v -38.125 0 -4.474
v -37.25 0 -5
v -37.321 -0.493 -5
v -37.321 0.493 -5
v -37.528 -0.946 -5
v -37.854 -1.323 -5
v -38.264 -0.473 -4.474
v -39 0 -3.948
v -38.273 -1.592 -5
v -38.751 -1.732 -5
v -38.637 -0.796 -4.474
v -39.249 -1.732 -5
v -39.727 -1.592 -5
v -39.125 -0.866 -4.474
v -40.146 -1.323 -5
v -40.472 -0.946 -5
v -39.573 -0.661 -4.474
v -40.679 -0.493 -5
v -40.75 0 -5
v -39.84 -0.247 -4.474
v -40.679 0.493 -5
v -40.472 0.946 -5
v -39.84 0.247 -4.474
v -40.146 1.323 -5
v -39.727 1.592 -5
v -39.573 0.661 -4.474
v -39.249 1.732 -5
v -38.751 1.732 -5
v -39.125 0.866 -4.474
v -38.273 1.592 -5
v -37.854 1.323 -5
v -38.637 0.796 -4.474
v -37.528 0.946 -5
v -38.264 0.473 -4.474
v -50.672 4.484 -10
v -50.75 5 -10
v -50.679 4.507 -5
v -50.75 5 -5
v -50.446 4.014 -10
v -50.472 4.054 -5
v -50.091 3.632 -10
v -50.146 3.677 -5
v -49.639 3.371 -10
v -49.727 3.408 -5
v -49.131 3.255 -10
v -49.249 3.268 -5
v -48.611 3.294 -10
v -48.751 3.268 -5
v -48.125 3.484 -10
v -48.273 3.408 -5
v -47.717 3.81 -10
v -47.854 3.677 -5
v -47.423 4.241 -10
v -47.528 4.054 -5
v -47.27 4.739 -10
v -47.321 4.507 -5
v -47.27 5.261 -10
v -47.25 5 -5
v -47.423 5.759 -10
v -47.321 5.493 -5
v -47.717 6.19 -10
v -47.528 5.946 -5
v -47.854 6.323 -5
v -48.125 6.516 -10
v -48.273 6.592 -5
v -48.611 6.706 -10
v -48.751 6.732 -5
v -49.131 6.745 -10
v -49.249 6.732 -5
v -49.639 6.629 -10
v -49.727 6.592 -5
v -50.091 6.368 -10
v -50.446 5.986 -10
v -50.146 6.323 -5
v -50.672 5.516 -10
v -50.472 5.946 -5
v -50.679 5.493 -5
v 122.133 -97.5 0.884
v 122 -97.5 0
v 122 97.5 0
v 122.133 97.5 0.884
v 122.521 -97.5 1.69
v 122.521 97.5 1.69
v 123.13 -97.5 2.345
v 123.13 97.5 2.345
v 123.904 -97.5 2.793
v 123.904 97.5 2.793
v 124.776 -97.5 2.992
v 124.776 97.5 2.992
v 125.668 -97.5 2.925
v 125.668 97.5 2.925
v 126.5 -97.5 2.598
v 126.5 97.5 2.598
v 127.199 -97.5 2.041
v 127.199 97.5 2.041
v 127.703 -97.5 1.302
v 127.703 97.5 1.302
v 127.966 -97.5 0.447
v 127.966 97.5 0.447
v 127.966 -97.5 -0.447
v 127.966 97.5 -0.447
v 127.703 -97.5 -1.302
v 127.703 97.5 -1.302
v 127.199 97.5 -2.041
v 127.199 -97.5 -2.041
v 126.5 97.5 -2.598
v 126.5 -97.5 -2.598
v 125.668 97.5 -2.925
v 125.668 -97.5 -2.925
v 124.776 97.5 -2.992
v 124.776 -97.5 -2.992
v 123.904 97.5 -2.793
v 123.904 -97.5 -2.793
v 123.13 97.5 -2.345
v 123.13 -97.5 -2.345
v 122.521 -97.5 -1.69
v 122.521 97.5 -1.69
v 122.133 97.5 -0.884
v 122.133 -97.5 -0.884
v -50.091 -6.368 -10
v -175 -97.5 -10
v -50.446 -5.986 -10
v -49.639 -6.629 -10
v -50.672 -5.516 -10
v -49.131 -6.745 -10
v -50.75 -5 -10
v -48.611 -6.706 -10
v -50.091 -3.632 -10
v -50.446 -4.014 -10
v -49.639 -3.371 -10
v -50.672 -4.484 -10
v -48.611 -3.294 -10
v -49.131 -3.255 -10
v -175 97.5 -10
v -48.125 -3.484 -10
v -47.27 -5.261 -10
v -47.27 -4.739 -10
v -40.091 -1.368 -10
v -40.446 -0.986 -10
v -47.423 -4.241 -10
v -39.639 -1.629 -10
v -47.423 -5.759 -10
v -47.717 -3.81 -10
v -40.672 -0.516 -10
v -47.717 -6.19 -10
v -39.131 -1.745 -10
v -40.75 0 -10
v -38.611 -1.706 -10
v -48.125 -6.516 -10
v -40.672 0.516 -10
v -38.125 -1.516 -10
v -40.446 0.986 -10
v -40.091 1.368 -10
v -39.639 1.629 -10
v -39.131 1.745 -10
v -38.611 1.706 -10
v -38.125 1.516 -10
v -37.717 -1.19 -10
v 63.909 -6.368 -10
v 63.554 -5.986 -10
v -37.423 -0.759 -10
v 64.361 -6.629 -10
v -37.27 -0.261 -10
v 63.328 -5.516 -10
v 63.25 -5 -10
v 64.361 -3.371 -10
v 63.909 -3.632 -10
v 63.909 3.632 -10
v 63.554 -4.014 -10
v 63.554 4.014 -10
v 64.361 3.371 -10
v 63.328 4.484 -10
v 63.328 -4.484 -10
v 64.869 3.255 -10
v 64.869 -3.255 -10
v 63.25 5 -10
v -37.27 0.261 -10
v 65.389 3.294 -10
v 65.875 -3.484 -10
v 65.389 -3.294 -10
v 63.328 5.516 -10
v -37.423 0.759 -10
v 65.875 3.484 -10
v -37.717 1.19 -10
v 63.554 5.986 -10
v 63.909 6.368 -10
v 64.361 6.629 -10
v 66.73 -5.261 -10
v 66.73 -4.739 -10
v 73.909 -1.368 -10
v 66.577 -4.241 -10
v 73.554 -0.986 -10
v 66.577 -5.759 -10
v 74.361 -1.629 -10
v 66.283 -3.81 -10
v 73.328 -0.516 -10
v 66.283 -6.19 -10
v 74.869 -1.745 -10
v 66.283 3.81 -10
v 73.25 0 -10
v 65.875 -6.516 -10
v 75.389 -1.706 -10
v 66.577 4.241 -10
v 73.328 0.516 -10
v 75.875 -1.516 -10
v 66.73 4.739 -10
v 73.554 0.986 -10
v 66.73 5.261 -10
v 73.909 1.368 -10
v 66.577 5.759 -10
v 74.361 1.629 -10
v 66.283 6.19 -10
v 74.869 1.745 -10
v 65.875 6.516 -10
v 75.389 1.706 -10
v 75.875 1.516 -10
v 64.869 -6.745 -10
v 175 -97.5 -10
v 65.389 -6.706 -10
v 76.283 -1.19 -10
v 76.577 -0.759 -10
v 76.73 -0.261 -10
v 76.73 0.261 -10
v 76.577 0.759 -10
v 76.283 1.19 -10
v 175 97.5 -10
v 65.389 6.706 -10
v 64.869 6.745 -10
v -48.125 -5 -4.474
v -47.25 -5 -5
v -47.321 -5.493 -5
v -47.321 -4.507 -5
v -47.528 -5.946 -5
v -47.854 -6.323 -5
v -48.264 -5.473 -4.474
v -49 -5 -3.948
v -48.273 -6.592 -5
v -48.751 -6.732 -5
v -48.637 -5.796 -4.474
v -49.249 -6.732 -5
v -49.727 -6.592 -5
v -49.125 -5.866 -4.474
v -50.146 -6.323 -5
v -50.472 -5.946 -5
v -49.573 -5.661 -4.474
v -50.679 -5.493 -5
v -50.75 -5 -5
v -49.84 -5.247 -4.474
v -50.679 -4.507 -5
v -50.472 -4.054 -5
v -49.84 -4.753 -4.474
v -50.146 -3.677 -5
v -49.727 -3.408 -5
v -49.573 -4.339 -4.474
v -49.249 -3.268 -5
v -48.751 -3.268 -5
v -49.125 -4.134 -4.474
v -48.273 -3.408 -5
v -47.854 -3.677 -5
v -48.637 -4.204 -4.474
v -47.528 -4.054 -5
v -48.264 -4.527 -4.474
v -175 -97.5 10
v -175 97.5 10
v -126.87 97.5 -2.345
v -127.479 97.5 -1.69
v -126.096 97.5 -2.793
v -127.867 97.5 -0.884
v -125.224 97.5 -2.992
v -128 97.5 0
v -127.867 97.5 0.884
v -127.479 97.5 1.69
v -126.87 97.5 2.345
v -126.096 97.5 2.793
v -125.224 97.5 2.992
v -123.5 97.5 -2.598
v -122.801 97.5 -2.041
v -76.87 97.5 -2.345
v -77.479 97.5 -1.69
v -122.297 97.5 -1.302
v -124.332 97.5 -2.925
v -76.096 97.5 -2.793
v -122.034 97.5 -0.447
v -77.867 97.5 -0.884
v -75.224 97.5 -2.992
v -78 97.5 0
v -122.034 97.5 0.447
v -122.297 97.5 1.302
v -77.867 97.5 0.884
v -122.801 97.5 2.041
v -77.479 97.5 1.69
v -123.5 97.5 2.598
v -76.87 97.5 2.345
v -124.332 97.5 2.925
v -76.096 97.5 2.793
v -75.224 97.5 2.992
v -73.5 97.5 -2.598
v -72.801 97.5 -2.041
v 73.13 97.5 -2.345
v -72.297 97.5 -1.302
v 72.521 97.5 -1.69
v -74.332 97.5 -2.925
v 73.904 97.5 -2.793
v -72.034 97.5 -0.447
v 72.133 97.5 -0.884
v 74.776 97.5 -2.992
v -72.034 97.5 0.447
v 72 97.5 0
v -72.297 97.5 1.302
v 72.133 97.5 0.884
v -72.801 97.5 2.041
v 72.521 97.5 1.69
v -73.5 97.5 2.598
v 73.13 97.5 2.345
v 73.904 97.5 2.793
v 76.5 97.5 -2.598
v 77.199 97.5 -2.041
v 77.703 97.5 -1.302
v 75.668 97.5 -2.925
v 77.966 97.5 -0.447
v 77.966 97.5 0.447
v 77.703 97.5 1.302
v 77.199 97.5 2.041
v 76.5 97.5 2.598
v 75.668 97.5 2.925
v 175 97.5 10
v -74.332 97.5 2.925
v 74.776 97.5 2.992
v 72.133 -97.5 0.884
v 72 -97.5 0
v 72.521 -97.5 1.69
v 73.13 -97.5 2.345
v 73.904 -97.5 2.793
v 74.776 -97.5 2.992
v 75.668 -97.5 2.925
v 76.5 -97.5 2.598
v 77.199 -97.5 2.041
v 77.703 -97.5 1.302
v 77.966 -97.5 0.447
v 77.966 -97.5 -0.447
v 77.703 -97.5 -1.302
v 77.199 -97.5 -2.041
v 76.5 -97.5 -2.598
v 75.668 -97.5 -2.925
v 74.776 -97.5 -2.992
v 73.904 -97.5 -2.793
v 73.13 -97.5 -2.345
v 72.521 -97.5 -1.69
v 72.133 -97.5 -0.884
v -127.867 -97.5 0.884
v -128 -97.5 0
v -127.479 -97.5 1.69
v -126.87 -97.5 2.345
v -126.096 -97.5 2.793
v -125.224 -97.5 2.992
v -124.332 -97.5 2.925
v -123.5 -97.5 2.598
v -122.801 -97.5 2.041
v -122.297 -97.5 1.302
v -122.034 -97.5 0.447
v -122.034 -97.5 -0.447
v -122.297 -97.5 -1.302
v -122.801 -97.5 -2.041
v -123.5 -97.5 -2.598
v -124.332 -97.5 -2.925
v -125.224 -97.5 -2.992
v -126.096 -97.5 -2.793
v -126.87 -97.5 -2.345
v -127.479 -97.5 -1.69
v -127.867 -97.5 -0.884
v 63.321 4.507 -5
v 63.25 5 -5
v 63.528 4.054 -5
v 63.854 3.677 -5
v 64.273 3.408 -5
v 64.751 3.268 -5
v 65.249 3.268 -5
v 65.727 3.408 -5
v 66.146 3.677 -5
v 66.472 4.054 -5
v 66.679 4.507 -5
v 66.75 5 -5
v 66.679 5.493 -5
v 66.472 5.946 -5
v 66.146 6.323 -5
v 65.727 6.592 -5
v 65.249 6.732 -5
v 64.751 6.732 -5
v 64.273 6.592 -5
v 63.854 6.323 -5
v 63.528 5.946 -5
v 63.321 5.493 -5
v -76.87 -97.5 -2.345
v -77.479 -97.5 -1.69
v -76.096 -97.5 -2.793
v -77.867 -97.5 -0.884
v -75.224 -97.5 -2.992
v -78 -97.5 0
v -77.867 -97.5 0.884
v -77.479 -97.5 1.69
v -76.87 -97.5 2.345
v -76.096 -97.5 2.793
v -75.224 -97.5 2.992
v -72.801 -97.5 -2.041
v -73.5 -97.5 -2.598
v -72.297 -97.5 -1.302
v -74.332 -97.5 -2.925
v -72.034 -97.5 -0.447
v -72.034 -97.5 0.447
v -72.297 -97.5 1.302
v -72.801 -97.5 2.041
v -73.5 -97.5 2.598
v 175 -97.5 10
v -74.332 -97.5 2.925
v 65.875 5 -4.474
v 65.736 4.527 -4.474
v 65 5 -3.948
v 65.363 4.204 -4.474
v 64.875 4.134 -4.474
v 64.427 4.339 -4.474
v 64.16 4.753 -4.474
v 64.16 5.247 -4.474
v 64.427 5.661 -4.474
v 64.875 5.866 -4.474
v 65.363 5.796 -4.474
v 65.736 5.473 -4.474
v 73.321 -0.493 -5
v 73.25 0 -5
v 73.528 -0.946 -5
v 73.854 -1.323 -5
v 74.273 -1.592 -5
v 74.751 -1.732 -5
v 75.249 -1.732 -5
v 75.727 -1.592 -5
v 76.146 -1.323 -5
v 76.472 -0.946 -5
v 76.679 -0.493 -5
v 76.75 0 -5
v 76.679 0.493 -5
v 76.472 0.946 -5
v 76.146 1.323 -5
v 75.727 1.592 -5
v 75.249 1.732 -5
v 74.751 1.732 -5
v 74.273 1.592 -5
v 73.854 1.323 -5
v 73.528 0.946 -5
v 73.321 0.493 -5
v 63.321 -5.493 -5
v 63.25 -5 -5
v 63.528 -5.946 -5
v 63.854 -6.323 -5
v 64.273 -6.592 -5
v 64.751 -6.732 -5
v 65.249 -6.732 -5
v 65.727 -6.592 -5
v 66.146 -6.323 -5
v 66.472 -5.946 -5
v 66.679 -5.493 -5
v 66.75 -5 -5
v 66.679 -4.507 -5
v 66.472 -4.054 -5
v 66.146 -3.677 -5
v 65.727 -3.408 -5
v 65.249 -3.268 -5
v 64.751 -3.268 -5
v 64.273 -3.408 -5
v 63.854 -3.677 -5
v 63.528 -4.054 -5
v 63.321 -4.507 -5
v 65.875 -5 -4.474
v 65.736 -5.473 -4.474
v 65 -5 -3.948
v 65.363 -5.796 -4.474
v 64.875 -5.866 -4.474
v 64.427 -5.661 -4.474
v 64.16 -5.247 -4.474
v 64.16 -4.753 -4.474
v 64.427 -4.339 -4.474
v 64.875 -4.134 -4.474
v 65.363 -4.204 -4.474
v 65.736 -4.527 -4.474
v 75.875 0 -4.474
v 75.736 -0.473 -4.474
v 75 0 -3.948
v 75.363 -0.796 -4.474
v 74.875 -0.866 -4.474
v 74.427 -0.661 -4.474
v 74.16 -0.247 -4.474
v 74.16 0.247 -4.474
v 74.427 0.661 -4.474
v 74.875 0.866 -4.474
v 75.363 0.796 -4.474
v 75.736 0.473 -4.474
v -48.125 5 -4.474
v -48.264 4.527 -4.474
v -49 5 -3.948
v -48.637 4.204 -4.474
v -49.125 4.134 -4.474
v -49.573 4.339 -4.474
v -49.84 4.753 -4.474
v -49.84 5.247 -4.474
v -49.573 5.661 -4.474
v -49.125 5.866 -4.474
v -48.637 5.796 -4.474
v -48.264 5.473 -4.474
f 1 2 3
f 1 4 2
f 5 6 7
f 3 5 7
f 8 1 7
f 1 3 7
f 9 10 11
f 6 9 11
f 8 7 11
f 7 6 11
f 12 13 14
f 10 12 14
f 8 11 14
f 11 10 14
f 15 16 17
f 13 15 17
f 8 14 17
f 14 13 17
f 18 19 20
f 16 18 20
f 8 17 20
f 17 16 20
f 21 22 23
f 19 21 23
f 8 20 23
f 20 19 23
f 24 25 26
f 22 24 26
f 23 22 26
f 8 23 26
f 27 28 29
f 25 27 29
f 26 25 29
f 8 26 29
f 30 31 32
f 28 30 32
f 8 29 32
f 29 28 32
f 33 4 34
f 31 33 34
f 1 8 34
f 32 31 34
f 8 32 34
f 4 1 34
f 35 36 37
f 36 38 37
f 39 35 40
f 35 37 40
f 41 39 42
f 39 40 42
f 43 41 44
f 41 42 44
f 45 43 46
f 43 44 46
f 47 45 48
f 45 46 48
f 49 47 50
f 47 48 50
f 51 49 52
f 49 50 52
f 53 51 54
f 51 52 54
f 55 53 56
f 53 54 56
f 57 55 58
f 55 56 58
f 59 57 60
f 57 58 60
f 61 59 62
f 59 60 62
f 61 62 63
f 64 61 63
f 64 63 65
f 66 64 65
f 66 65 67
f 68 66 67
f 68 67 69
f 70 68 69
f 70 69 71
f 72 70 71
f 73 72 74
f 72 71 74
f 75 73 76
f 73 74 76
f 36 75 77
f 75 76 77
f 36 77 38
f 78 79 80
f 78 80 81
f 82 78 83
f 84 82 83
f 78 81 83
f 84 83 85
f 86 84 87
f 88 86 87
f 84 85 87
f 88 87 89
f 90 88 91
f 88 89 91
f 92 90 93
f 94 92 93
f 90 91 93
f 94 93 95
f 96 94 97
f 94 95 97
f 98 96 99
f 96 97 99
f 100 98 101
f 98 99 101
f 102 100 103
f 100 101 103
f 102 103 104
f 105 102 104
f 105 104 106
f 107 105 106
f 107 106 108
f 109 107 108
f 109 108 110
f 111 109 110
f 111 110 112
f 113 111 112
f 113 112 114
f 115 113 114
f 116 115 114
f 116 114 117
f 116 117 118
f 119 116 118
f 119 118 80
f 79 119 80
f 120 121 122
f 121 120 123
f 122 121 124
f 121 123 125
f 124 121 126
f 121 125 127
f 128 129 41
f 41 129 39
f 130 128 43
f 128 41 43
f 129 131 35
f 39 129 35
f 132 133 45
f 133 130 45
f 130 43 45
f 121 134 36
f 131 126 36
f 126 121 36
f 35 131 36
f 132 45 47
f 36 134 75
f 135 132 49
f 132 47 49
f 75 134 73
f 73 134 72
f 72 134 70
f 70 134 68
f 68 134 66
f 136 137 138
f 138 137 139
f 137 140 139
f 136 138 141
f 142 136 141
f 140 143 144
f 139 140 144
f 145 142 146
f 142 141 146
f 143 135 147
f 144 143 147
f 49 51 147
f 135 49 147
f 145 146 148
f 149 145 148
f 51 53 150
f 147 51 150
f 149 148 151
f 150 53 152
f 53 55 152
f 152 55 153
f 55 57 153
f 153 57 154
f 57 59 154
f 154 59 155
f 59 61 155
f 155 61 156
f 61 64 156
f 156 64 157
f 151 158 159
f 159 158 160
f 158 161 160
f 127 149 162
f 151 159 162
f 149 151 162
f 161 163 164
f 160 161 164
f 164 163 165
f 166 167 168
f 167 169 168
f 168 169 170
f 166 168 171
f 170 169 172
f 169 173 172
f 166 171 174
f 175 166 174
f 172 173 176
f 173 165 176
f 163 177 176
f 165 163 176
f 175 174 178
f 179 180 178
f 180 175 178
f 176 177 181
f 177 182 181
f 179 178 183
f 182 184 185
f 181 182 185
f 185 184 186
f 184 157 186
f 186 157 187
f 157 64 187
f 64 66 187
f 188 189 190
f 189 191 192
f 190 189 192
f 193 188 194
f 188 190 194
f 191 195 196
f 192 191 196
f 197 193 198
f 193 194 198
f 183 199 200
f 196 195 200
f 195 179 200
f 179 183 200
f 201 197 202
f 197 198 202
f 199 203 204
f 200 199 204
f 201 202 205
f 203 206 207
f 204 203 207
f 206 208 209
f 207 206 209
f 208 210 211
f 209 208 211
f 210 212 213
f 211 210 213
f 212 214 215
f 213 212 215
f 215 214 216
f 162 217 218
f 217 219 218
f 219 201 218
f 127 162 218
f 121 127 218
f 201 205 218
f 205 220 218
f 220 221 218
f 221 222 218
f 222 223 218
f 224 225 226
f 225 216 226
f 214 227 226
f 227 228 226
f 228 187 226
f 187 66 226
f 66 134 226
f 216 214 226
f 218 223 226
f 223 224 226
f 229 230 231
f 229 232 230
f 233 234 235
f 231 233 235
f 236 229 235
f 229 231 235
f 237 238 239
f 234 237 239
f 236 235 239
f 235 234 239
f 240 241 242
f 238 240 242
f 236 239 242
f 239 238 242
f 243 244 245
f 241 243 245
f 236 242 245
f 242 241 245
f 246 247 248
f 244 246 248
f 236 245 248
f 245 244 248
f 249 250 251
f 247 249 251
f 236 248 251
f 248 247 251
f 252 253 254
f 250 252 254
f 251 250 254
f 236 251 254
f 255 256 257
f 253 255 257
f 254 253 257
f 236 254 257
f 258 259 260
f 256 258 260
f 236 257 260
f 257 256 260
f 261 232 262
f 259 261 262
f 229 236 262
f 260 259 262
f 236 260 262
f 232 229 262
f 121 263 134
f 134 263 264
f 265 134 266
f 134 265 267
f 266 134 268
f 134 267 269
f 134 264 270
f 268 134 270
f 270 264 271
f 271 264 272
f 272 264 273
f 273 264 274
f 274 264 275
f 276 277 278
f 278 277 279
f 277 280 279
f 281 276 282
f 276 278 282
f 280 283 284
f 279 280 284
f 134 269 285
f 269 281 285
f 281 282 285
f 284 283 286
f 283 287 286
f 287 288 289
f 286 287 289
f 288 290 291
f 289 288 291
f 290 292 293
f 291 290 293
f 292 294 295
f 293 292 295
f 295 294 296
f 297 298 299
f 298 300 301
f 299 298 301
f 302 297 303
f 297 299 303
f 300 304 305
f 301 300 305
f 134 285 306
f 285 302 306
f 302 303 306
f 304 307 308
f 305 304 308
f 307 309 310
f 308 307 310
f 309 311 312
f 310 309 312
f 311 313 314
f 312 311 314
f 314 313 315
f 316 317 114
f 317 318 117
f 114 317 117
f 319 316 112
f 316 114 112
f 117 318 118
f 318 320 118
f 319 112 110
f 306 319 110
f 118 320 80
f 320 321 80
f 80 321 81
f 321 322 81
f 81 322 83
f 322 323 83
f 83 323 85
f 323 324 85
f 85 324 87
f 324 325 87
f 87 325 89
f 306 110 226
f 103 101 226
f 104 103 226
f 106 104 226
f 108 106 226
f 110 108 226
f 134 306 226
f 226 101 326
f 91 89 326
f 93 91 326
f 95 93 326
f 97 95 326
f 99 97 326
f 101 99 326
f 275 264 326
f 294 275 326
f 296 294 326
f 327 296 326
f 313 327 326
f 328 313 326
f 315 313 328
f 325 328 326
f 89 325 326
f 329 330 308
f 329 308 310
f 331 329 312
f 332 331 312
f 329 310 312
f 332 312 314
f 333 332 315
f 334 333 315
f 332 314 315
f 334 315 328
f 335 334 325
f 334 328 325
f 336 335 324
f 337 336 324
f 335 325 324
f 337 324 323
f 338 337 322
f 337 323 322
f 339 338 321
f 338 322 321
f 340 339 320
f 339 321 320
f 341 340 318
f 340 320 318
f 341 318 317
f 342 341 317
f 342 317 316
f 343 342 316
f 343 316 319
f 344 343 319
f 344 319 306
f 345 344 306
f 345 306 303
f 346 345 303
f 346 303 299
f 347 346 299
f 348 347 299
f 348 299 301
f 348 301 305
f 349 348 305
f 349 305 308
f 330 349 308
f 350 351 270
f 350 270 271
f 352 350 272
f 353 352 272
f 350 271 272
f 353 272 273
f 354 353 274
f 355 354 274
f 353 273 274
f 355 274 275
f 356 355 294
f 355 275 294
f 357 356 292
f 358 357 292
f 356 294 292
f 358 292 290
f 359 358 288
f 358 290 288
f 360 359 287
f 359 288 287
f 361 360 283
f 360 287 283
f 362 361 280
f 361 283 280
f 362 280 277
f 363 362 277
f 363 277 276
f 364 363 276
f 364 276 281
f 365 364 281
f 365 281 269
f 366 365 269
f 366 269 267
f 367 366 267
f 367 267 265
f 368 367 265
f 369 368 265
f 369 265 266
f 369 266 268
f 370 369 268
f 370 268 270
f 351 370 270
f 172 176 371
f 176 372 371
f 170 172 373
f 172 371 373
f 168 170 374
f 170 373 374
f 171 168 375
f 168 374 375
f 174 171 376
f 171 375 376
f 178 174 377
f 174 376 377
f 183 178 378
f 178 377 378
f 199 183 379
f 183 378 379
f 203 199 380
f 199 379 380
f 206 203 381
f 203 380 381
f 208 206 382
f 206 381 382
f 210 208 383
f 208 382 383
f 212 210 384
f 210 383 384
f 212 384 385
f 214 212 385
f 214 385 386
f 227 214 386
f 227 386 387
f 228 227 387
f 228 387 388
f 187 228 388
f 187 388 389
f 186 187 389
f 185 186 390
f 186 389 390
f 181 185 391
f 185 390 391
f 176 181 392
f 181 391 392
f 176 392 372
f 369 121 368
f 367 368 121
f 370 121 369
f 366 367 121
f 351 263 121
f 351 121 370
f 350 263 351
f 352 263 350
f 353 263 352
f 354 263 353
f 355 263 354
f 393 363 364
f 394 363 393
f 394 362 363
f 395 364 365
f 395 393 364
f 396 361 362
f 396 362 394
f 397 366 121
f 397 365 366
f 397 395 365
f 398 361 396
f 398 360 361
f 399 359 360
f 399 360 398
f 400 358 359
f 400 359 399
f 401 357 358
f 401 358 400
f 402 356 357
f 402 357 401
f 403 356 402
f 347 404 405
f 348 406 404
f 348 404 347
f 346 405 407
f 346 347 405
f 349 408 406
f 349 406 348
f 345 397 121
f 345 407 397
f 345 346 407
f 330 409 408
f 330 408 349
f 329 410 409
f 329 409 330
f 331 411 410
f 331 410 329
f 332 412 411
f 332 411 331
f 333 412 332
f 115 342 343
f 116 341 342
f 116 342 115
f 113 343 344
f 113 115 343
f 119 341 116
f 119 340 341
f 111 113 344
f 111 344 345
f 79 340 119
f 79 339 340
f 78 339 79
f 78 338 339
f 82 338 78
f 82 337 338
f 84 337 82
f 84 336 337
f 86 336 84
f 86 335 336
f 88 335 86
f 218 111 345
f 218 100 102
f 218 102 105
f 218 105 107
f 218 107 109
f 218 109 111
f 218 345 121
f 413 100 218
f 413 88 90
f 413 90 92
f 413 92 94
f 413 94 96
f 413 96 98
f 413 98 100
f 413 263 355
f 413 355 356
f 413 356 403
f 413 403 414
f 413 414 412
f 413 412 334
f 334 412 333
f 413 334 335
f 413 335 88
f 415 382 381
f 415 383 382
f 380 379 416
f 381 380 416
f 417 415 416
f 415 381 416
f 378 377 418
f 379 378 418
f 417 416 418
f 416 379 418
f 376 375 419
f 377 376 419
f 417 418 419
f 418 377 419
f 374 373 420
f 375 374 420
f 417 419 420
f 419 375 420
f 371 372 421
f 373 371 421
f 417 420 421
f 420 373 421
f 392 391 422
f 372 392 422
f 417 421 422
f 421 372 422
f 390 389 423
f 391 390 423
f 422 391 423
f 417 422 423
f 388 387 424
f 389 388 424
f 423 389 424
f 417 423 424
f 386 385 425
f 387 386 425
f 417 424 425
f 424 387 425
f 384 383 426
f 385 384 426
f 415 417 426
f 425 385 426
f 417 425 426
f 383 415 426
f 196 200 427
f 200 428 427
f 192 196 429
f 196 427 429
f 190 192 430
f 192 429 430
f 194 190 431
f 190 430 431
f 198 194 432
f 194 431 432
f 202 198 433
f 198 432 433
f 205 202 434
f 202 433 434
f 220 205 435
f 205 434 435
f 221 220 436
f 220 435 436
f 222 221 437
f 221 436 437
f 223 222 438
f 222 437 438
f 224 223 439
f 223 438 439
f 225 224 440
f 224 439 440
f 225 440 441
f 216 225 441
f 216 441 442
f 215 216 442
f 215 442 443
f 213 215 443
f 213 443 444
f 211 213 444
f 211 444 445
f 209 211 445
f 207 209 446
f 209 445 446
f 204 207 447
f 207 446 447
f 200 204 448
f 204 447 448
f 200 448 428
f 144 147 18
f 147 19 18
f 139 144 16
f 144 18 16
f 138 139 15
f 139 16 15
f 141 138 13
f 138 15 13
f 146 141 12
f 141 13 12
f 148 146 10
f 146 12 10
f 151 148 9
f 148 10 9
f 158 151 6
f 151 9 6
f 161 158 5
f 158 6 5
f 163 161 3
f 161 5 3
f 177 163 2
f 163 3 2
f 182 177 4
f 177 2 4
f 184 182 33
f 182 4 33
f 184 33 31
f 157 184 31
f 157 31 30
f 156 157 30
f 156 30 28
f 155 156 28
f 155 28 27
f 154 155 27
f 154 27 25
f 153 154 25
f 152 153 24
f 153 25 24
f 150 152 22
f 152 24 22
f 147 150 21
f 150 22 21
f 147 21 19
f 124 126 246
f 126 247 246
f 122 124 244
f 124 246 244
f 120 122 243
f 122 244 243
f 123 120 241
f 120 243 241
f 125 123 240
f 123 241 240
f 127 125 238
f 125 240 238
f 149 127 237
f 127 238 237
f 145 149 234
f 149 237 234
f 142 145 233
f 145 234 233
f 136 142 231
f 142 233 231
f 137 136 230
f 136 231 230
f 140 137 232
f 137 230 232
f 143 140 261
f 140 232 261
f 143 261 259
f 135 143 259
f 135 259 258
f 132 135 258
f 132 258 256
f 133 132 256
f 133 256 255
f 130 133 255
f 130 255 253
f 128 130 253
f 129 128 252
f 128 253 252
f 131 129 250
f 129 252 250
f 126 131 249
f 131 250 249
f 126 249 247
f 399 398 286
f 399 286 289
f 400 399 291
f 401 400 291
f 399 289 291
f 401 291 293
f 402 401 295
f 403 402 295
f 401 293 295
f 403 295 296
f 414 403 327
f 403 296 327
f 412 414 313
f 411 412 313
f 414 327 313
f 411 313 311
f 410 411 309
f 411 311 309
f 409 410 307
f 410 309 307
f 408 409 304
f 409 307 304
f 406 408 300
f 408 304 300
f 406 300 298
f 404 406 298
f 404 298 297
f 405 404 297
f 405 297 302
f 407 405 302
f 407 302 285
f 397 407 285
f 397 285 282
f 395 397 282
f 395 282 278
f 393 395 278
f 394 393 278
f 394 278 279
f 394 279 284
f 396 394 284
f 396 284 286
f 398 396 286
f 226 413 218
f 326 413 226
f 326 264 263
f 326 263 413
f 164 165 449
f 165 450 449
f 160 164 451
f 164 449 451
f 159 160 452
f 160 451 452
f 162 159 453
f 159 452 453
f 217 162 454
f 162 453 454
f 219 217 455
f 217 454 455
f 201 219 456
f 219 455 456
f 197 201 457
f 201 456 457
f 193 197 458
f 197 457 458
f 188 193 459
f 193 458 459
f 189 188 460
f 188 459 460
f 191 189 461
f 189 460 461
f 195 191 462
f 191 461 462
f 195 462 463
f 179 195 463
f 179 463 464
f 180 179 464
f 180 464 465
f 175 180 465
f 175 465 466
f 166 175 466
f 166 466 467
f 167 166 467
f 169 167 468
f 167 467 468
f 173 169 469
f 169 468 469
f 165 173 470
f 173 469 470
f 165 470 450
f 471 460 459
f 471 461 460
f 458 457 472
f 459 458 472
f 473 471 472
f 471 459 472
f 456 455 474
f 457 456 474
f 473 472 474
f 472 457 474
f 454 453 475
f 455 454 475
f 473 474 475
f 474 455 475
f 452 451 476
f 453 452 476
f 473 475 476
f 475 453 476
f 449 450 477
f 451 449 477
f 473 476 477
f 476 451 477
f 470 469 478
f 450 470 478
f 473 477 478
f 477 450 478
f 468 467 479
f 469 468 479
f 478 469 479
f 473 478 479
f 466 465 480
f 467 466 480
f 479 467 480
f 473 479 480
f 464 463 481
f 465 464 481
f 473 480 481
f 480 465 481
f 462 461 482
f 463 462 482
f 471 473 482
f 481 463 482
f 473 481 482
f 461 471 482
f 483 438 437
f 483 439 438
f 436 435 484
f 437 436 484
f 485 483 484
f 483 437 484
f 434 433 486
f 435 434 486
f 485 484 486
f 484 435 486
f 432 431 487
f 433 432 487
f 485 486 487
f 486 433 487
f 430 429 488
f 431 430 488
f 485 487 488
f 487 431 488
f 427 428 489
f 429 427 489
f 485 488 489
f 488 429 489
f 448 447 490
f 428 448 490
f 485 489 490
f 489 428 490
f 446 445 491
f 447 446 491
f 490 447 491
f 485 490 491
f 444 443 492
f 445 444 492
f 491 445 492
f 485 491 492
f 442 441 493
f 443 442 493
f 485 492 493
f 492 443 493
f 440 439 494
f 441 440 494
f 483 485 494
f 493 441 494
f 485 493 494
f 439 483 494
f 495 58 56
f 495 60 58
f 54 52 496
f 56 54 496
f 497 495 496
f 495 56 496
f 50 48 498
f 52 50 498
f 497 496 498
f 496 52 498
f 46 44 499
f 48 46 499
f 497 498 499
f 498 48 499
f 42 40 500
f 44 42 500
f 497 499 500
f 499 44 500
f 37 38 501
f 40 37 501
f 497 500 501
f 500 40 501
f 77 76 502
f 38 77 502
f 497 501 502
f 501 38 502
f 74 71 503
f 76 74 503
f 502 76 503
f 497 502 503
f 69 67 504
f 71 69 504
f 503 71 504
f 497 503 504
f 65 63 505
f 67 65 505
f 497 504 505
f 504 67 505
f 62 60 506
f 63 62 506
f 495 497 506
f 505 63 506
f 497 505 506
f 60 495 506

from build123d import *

# Parameters (mm, degrees)
F0_W     = 350
F0_H     = 195
F1_DEPTH = 10
F3_D     = 6
F5_D     = 3.5
F5_DEPTH = 5
F5_TIP   = 1.0515060833


with BuildPart() as f1:
    # F0 (on Top) → F1 (new body, symmetric)
    with BuildSketch(Plane.XY):
        Rectangle(F0_W, F0_H)
    extrude(amount=F1_DEPTH, both=True)

    # F3 (through all)
    with Locations(Plane.XZ.offset(97.5)):
        with Locations((-125, 0), (-75, 0), (75, 0), (125, 0)):
            Hole(F3_D / 2)

    # F5
    with Locations(Plane(origin=(0, 0, -10), x_dir=(1, 0, 0), z_dir=(0, 0, -1))):
        with Locations((-49, 5), (-49, -5), (-39, 0), (65, 5), (65, -5), (75, 0)):
            Hole(F5_D / 2, depth=F5_DEPTH)
            with Locations((0, 0, -(F5_DEPTH + F5_TIP / 2))):  # 118° drill point
                Cone(0, F5_D / 2, F5_TIP, mode=Mode.SUBTRACT)


solid = f1.part
